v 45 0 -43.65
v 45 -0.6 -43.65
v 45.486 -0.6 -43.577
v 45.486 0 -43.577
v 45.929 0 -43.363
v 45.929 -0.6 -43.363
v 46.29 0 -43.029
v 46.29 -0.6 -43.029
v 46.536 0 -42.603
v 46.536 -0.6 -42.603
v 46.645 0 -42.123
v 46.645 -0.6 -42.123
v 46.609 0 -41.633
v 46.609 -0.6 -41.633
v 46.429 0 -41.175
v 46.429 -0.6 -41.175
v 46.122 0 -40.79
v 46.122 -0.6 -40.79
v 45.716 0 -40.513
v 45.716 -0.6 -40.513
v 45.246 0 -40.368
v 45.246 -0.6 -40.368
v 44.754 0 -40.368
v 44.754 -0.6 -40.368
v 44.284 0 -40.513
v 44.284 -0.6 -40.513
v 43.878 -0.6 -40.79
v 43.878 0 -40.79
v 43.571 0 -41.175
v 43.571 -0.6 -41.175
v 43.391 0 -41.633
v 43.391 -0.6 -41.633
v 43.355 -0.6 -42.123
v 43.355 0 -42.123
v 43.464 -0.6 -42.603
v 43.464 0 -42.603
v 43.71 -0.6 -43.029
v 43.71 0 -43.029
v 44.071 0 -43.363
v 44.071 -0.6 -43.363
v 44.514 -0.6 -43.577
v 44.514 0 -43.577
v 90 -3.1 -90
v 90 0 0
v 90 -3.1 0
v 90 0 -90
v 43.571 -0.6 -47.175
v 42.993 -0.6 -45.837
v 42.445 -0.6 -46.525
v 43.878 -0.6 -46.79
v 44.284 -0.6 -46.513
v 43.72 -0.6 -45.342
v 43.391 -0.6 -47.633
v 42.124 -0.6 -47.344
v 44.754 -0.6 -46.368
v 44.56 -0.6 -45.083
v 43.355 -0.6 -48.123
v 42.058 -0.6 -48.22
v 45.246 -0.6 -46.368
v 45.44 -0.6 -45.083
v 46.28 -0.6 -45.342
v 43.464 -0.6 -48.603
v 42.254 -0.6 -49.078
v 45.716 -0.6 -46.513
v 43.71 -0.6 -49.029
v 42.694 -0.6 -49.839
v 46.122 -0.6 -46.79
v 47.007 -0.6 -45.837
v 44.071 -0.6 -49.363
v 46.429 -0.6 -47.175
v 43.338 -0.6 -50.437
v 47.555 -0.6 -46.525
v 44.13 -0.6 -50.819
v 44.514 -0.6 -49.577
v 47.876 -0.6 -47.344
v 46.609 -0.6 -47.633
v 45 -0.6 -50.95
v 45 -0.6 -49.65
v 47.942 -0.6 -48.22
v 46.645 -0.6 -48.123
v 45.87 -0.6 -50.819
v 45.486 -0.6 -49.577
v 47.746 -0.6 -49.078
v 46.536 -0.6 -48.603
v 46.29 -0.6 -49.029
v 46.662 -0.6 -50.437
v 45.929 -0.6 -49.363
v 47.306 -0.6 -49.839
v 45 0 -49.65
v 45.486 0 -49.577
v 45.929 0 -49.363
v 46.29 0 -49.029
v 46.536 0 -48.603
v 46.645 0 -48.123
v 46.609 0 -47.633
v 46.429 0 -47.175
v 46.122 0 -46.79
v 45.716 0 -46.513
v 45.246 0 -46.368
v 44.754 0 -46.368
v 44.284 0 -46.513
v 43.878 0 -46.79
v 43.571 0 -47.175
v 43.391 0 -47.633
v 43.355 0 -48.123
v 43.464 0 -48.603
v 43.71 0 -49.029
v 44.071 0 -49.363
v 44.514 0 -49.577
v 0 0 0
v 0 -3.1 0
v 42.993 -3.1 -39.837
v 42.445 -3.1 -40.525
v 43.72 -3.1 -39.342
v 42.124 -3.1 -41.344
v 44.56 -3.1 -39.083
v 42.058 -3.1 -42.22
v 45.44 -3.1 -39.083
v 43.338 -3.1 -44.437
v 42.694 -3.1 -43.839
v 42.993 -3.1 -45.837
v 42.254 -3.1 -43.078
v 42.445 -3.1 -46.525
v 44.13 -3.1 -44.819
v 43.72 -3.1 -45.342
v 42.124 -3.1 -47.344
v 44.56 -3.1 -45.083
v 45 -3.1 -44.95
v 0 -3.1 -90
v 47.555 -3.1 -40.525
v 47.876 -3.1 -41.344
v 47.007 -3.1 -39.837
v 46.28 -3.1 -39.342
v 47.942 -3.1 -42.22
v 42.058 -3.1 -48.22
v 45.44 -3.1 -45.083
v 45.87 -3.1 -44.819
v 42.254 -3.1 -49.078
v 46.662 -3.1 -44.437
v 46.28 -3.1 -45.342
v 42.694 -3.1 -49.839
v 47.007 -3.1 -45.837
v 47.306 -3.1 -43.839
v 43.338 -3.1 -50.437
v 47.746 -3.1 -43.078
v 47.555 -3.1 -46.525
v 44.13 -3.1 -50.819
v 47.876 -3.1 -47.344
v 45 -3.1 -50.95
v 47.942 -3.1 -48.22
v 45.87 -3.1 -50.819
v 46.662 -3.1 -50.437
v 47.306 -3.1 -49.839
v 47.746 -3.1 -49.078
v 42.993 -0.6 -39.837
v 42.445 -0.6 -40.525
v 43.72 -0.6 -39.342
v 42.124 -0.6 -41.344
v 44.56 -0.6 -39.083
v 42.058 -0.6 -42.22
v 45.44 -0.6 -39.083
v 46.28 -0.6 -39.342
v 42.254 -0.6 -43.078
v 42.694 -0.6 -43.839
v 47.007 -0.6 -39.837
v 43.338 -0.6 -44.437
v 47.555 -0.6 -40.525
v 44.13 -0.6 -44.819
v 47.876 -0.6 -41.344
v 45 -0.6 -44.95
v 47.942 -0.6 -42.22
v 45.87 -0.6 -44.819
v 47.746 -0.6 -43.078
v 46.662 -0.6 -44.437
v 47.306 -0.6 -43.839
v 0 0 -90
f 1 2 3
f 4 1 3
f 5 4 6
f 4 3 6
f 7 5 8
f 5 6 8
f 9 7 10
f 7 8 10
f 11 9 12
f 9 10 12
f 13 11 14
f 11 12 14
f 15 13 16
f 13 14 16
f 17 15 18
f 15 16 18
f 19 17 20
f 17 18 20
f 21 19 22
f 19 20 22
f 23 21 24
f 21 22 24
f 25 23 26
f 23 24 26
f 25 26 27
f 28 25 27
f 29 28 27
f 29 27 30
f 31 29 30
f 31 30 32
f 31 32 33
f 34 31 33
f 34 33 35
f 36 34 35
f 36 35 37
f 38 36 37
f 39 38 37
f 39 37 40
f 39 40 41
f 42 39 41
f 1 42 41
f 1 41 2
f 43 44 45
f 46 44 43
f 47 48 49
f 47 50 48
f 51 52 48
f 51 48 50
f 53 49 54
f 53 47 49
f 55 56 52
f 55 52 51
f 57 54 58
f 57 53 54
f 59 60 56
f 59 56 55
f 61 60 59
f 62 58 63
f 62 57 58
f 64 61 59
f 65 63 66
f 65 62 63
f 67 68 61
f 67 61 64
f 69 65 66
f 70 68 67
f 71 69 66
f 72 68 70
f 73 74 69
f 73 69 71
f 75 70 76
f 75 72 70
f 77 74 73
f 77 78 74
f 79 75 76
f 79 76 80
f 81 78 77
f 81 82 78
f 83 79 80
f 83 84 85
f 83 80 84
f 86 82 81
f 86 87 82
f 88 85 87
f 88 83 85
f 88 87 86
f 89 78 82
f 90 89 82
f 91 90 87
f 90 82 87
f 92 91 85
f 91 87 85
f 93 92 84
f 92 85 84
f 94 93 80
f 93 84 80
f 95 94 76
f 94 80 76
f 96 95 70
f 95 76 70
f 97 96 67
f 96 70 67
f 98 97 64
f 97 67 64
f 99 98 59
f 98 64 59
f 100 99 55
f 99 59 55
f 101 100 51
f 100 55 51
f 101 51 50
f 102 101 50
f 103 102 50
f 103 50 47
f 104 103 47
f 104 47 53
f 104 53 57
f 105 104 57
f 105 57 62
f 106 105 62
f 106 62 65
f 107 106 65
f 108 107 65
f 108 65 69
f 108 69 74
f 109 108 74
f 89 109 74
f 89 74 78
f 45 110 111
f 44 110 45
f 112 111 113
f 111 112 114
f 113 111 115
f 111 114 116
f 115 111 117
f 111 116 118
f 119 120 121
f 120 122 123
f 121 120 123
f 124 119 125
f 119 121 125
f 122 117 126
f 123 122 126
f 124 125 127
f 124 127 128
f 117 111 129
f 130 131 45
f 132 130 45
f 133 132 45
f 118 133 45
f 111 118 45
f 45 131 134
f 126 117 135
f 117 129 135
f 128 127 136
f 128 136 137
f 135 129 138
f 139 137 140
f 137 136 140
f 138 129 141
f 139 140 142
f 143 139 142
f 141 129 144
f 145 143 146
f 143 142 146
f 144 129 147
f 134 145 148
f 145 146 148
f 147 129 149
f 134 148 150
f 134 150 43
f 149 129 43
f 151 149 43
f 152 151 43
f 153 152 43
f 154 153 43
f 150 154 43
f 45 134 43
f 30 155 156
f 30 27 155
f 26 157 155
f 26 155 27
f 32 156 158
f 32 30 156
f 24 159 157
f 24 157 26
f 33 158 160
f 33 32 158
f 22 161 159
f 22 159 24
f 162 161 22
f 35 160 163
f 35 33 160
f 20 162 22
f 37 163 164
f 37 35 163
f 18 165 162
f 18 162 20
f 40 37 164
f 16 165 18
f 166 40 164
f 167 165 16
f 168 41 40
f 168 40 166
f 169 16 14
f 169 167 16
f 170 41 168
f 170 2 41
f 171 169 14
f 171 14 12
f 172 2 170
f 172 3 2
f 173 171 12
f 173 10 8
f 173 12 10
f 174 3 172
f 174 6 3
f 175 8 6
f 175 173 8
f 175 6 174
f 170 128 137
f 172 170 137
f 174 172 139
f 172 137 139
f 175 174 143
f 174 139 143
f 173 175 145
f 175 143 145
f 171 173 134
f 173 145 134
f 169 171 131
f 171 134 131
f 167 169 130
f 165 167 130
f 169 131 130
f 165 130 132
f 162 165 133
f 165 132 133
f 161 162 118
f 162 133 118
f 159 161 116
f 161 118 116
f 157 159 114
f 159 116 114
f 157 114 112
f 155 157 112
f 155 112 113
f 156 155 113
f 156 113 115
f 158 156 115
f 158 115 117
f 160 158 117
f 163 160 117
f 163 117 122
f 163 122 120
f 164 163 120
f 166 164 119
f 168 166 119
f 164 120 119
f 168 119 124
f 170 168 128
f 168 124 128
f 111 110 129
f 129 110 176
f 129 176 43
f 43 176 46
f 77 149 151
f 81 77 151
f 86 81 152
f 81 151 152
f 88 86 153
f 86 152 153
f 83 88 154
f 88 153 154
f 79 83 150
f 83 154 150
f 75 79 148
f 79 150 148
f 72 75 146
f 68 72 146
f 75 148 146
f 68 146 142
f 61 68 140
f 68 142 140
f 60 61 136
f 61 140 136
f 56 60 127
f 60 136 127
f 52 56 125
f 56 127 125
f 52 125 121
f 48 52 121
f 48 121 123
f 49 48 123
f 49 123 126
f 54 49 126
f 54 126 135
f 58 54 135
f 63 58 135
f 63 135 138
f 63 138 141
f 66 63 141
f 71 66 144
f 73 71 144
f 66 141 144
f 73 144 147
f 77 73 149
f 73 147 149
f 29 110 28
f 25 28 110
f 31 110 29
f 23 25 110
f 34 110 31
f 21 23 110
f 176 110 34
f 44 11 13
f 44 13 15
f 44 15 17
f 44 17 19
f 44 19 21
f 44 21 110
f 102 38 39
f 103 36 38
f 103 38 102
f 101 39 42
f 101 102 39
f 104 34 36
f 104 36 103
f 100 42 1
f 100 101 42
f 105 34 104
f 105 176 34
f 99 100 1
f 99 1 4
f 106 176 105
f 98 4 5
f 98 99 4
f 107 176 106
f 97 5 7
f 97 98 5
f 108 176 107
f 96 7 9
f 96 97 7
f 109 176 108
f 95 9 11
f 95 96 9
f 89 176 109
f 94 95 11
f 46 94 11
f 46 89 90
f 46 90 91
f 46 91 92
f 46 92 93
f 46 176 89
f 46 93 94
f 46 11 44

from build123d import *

# Parameters (mm, degrees)
SKETCH1_W           = 90
SKETCH1_H           = 90
BOSS_EXTRUDE1_DEPTH = 3.1
SKETCH2_R           = 1.65
CUT_EXTRUDE1_DEPTH  = 128.316966662
SKETCH5_R           = 2.95
CUT_EXTRUDE2_DEPTH  = 2.5


with BuildPart() as part:
    # Sketch1 → Boss-Extrude1 (new body)
    with BuildSketch(Plane(origin=(0, 0, 0), x_dir=(1, 0, 0), z_dir=(0, 1, 0))):
        with Locations((45, 45)):
            Rectangle(SKETCH1_W, SKETCH1_H)
    extrude(amount=-BOSS_EXTRUDE1_DEPTH)

    # Sketch2 → Cut-Extrude1 (cut, through all)
    with BuildSketch(Plane.XZ.offset(3.1)):
        with Locations(Location((45, -42, 0), (0, 0, 270))):
            Circle(SKETCH2_R)
        with Locations(Location((45, -48, 0), (0, 0, 270))):
            Circle(SKETCH2_R)
    extrude(amount=-CUT_EXTRUDE1_DEPTH, mode=Mode.SUBTRACT)

    # Sketch5 → Cut-Extrude2 (cut)
    with BuildSketch(Plane.XZ.offset(3.1)):
        with Locations(Location((45, -42, 0), (0, 0, 270))):
            Circle(SKETCH5_R)
        with Locations(Location((45, -48, 0), (0, 0, 270))):
            Circle(SKETCH5_R)
    extrude(amount=-CUT_EXTRUDE2_DEPTH, mode=Mode.SUBTRACT)


solid = part.part
